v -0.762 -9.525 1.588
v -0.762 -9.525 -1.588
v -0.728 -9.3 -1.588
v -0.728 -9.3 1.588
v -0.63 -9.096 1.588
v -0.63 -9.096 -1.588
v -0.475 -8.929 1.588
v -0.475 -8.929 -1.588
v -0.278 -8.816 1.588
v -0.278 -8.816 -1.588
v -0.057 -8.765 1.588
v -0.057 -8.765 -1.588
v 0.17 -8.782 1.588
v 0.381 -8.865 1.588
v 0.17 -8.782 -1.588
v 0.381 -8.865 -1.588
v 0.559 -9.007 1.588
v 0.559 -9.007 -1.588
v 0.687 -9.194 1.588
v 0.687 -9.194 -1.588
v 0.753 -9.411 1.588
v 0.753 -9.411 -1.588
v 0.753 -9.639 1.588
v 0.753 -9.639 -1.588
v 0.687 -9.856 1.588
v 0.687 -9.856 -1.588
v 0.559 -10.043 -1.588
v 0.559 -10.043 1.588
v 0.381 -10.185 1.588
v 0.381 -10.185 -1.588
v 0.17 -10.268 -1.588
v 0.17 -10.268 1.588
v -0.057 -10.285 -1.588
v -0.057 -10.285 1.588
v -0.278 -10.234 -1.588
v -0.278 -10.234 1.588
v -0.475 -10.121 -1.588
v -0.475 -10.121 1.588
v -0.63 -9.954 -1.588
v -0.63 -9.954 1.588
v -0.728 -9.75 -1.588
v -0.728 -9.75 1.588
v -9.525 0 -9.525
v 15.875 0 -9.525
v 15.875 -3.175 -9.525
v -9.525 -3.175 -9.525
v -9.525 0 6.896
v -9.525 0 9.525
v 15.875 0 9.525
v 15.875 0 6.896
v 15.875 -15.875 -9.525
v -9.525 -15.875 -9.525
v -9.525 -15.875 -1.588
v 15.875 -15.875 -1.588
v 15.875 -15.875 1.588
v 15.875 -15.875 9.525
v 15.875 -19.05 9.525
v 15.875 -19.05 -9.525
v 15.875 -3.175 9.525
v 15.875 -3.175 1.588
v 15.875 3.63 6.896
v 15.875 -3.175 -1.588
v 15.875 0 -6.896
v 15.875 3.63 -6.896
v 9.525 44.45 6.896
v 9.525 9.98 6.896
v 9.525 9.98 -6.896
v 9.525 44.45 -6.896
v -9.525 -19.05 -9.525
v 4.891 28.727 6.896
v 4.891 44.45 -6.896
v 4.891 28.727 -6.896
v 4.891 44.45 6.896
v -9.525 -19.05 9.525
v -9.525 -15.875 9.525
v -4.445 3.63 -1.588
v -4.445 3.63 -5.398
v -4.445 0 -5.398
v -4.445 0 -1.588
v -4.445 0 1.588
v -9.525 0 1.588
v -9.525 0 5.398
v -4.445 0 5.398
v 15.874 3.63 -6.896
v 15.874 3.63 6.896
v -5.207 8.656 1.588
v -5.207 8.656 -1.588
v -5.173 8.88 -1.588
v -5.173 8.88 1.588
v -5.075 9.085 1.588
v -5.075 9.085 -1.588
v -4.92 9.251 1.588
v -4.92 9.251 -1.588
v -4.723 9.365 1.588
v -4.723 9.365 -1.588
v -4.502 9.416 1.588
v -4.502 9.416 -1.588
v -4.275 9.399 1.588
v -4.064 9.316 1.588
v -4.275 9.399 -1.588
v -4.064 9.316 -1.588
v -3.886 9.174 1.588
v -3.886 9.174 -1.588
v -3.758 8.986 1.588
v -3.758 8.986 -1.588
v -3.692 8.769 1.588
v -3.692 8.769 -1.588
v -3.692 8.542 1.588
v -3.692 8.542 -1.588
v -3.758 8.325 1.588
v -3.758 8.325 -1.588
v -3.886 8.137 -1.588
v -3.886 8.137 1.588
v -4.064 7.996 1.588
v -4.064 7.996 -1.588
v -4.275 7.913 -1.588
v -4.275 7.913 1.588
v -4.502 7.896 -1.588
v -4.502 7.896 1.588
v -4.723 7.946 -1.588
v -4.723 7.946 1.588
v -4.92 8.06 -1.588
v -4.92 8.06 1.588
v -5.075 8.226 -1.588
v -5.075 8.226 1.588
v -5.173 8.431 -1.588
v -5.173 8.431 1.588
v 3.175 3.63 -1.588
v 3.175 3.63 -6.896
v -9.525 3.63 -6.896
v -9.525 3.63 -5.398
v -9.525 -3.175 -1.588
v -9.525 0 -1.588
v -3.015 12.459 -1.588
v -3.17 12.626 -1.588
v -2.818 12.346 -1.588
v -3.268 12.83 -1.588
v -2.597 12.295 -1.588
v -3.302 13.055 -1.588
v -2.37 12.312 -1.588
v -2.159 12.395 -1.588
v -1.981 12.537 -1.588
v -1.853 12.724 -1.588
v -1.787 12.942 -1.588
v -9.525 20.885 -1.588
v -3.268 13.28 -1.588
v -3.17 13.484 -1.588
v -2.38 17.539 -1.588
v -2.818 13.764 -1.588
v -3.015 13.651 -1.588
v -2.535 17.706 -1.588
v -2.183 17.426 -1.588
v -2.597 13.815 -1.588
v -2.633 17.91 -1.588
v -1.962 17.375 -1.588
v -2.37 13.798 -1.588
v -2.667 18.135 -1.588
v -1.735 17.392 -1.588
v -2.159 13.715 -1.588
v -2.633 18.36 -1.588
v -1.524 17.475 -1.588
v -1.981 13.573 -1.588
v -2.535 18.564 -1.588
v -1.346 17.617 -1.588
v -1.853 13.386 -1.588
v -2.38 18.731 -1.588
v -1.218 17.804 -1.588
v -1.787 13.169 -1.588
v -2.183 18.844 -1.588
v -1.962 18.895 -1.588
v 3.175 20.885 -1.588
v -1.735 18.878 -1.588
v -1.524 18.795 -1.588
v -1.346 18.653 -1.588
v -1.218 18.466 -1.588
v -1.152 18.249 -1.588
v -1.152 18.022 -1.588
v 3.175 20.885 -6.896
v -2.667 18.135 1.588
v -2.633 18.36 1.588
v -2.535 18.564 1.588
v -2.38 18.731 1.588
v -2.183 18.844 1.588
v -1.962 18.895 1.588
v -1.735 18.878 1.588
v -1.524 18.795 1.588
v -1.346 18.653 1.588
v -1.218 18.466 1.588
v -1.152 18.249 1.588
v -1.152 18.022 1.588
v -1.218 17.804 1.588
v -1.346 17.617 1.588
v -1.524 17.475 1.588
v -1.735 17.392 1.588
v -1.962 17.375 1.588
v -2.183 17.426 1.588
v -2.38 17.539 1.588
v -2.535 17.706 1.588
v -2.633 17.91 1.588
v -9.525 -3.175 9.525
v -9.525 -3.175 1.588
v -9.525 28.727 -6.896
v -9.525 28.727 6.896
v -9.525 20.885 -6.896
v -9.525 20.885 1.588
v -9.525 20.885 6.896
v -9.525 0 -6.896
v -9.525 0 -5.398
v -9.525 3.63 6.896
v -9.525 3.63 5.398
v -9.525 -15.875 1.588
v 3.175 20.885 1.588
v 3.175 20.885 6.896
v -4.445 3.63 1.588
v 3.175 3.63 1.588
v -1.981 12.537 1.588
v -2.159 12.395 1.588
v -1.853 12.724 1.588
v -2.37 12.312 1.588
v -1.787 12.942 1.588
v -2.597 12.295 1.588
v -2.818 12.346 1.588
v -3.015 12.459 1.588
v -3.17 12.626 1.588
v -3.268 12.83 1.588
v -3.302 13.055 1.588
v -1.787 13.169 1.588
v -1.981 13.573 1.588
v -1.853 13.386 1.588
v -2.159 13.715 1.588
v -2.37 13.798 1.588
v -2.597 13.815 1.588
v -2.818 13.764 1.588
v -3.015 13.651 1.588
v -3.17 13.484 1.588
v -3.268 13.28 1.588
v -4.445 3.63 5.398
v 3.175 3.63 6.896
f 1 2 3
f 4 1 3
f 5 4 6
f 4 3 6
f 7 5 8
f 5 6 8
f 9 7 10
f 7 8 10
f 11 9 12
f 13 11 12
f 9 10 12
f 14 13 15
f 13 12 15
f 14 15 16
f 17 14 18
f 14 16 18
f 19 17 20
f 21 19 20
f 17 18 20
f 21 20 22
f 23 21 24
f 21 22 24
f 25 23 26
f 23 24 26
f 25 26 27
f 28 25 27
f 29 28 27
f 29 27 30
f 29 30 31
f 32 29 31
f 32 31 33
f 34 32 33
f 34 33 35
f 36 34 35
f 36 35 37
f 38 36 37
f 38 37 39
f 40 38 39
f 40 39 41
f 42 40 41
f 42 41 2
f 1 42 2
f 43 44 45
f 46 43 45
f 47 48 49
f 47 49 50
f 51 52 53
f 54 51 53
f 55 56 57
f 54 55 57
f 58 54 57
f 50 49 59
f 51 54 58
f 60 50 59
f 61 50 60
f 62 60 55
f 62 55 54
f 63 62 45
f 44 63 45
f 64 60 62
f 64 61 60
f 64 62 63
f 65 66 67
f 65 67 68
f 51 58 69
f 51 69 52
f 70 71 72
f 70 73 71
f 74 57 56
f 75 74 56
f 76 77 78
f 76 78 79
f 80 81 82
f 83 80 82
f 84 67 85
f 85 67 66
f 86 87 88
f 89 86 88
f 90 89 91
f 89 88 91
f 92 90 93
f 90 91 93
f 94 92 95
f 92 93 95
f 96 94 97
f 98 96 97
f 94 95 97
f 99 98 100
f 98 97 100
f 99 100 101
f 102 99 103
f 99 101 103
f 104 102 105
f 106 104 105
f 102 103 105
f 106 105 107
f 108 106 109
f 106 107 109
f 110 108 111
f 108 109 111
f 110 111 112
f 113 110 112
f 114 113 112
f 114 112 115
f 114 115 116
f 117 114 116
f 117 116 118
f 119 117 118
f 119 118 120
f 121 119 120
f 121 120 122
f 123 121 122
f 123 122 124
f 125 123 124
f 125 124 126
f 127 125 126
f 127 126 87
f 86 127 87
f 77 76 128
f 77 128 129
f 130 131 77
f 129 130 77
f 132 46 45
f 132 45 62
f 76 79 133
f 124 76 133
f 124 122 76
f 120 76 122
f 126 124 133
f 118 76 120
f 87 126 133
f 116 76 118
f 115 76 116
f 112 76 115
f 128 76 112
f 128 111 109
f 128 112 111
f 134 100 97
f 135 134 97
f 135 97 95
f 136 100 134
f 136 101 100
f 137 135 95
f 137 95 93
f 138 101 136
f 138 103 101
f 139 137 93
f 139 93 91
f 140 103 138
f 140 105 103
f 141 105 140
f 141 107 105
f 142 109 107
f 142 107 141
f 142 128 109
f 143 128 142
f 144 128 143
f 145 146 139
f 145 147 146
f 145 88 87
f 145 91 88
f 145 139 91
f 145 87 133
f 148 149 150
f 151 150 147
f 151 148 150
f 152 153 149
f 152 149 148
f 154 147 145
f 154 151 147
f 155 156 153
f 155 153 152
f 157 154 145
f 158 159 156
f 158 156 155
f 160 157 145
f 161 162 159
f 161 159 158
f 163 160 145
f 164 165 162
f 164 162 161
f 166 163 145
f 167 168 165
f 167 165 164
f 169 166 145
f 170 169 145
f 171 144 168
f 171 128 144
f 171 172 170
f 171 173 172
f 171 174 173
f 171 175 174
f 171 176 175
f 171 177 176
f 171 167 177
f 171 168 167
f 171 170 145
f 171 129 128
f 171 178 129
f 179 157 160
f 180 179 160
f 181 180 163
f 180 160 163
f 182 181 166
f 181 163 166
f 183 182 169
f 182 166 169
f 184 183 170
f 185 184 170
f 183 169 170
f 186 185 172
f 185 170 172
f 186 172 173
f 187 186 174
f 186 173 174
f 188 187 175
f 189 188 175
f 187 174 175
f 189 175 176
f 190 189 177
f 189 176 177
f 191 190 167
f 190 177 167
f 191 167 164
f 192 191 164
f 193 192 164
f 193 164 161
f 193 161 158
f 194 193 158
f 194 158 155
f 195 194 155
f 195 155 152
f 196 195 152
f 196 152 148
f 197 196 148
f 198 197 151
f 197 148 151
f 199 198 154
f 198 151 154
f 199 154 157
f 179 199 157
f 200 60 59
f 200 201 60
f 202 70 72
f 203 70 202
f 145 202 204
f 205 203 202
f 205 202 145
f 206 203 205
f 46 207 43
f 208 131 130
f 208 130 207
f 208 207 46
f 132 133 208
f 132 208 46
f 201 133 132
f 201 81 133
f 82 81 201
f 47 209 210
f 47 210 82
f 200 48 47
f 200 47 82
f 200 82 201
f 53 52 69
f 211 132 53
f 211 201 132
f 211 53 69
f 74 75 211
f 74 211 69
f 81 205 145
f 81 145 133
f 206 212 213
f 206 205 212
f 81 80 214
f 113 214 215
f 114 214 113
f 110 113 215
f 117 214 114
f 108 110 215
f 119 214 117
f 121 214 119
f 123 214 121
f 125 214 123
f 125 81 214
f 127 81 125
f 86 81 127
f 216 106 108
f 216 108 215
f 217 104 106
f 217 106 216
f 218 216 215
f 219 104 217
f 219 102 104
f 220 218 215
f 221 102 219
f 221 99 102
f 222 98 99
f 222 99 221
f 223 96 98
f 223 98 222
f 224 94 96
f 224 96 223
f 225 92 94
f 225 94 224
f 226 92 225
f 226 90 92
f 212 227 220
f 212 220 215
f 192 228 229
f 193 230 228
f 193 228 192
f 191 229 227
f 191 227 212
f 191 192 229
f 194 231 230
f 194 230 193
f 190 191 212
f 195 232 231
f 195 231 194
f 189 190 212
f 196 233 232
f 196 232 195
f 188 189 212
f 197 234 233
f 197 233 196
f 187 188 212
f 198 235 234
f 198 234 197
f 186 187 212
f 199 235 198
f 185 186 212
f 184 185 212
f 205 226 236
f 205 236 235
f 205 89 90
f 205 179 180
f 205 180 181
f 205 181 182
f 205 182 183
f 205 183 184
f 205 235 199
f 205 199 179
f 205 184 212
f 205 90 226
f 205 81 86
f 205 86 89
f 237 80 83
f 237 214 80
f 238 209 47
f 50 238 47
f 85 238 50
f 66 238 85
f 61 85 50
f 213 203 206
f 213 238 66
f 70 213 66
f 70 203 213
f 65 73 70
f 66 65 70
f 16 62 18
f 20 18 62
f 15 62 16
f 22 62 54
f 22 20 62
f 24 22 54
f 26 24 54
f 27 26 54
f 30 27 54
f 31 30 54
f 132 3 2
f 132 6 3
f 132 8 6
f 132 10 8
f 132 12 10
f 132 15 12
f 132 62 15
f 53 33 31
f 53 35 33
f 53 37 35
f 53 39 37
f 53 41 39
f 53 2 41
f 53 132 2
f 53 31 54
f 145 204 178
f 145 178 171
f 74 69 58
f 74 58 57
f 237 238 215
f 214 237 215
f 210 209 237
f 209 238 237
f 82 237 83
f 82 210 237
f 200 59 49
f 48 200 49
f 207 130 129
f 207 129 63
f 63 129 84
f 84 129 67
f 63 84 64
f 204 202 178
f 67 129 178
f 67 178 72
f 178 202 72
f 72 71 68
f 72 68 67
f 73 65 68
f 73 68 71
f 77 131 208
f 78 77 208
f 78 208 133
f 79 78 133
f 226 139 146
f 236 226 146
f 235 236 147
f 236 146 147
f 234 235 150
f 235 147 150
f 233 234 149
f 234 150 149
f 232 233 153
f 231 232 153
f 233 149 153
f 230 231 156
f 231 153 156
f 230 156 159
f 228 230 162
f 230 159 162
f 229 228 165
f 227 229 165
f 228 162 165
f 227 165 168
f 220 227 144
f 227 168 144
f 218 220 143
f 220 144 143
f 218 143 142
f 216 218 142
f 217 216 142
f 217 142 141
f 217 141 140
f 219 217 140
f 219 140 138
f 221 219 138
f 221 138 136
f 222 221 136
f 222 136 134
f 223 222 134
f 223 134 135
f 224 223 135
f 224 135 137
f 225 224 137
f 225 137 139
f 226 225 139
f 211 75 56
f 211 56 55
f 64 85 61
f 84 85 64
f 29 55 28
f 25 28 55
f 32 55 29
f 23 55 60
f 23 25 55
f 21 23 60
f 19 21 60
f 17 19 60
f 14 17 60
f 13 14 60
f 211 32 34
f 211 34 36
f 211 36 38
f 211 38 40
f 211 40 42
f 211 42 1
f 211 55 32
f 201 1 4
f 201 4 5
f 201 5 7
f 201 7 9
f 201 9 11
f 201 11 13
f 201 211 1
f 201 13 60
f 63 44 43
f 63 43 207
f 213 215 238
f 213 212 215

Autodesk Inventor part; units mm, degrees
ref_plane "YZ Plane" through (0, 0, 0) normal (1, 0, 0) x (0, 1, 0)
ref_plane "XZ Plane" through (0, 0, 0) normal (0, 1, 0) x (-1, 0, 0)
ref_plane "XY Plane" through (0, 0, 0) normal (0, 0, 1) x (1, 0, 0)
sketch "Sketch1" plane through (0, 0, 0) normal (0, 0, 1) x (1, 0, 0)
  line L0 (-9.525, 0) -> (9.525, 0)
  line L1 (9.525, 0) -> (9.525, 44.45)
  line L2 (9.525, 44.45) -> (5.715, 44.45)
  line L3 (5.715, 44.45) -> (4.891, 28.7274)
  line L4 (4.891, 28.7274) -> (-9.525, 28.7274)
  line L5 (-9.525, 28.7274) -> (-9.525, 0)
  point P0 (0, 0)
  point P1 (0, 0)
  dimension "d0" = 44.45
  dimension "d1" = 15.24
  dimension "d2" = 15.7226
  dimension "d3" = 19.05
  dimension "d14" = 93
extrude "Extrusion1" add sketch "Sketch1" along normal mid plane 15.7226
sketch "Sketch2" plane through (0, 0, 0) normal (1, 0, 0) x (0, 1, 0)
  line L0 (-19.05, 9.525) -> (-19.05, -9.525)
  line L1 (-19.05, -9.525) -> (-15.875, -9.525)
  line L2 (-15.875, -9.525) -> (-15.875, -1.5875)
  line L3 (-15.875, -1.5875) -> (-3.175, -1.5875)
  line L4 (-3.175, -1.5875) -> (-3.175, -9.525)
  line L5 (-3.175, -9.525) -> (0, -9.525)
  line L6 (0, -9.525) -> (0, 9.525)
  line L7 (0, 9.525) -> (-3.175, 9.525)
  line L8 (-3.175, 9.525) -> (-3.175, 1.5875)
  line L9 (-3.175, 1.5875) -> (-15.875, 1.5875)
  line L10 (-15.875, 1.5875) -> (-15.875, 9.525)
  line L11 (-15.875, 9.525) -> (-19.05, 9.525)
  line L12 (0, -7.8613) -> (0, 7.8613) projected
  point P0 (0, 0)
  point P1 (0, 0)
  dimension "d6" = 19.05
  dimension "d7" = 19.05
  dimension "d8" = 3.175
  dimension "d9" = 3.175
extrude "Extrusion2" add sketch "Sketch2" along normal mid plane 19.05
sketch "Sketch6" plane through (0, 0, 7.8613) normal (0, 0, 1) x (1, 0, 0)
  line L0 (4.891, 28.7274) -> (9.525, 28.7274)
  line L1 (9.525, 28.7274) -> (9.525, 44.45)
  line L2 (9.525, 44.45) -> (4.891, 44.45)
  line L3 (4.891, 44.45) -> (4.891, 28.7274)
  point P0 (0, 0)
extrude "Extrusion3" add sketch "Sketch6" against normal blind 15.7226
sketch "Sketch9" plane through (0, 0, 7.8613) normal (0, 0, 1) x (1, 0, 0)
  line L0 (4.891, 44.45) -> (4.891, 28.7274) projected
  line L1 (-9.525, 28.7274) -> (-9.525, 0) projected
  line L2 (4.891, 28.7274) -> (-2.729, 28.7274)
  line L3 (4.891, 28.7274) -> (-9.525, 28.7274) projected
  line L4 (-9.525, 28.7274) -> (-9.525, 26.7462)
  line L5 (-9.525, 26.7462) -> (-2.729, 28.7274)
  point P0 (0, 0)
  dimension "d22" = 14.416
  dimension "d23" = 7.62
  dimension "d24" = 1.9812
extrude "Extrusion5" cut sketch "Sketch9" against normal blind 25.4
fillet "Fillet2" radius 5.08 1 edges at (-2.729, 28.7274, 0)
sketch "Sketch10" plane through (-9.525, -15.875, 1.5875) normal (0, 0, 1) x (1, 0, 0)
  circle A0 centre (9.525, 6.35) radius 0.635
  line L0 (0, 0) -> (0, 12.7) projected
  line L1 (19.05, -3.175) -> (0, -3.175) projected
  point P0 (9.525, 15.875)
  dimension "d28" = 9.525
  dimension "d29" = 9.525
  dimension "d30" = 1.27
extrude "Extrusion6" cut sketch "Sketch10" against normal blind 25.4
sketch "Sketch12" plane through (-9.525, -15.875, -1.5875) normal (-1, 0, 0) x (0, 0, 1)
  line L0 (-6.2738, 60.325) -> (-6.2738, 15.875) projected
  line L1 (9.4488, 42.6212) -> (9.4488, 15.875) projected
  line L2 (-6.2738, 36.7601) -> (9.4488, 36.7601)
  line L3 (9.4488, 36.7601) -> (9.4488, 19.5053)
  line L4 (9.4488, 19.5053) -> (-6.2738, 19.5053)
  line L5 (-6.2738, 19.5053) -> (-6.2738, 36.7601)
  point P0 (1.5875, 15.875)
extrude "Extrusion7" cut sketch "Sketch12" against normal blind 12.7
sketch "Sketch13" plane through (3.175, -15.875, -1.5875) normal (-1, 0, 0) x (0, 0, 1)
  line L0 (0, 12.7) -> (0, 36.7601)
  line L1 (-6.2738, 36.7601) -> (9.4488, 36.7601) projected
  line L2 (0, 12.7) -> (0, 0) projected
  line L3 (3.175, 12.7) -> (3.175, 36.7601)
  line L4 (3.175, 0) -> (3.175, 12.7) projected
  line L5 (9.4488, 19.5053) -> (-6.2738, 19.5053) projected
  line L6 (0, 36.7601) -> (3.175, 36.7601)
  line L7 (3.175, 36.7601) -> (3.175, 19.5053)
  line L8 (3.175, 19.5053) -> (0, 19.5053)
  line L9 (0, 19.5053) -> (0, 36.7601)
  point P0 (1.5875, 15.875)
extrude "Extrusion8" add sketch "Sketch13" along normal blind 12.7
sketch "Sketch15" plane through (3.175, 3.6303, 1.5875) normal (0, 0, 1) x (1, 0, 0)
  circle A0 centre (-7.62, 5.0254) radius 0.635
  line L0 (-12.7, 0) -> (-12.7, 17.2548) projected
  circle A1 centre (-5.715, 9.4248) radius 0.635
  circle A2 centre (-5.08, 14.5048) radius 0.635
  point P0 (-3.175, -3.6303)
  dimension "d40" = 5.08
  dimension "d41" = 1.27
  dimension "d42" = 1.27
  dimension "d45" = 1.27
  dimension "d46" = 6.985
  dimension "d47" = 7.62
extrude "Extrusion9" cut sketch "Sketch15" against normal blind 12.7
sketch "Sketch17" plane through (-9.525, -15.875, -1.5875) normal (-1, 0, 0) x (0, 0, 1)
  line L0 (-7.9375, 15.875) -> (11.1125, 15.875)
  line L1 (0, 19.5053) -> (-3.81, 19.5053)
  line L2 (-3.81, 19.5053) -> (-3.81, 15.875)
  line L3 (-3.81, 15.875) -> (0, 15.875)
  line L4 (0, 15.875) -> (0, 19.5053)
  line L5 (3.175, 19.5053) -> (6.985, 19.5053)
  line L6 (6.985, 19.5053) -> (6.985, 15.875)
  line L7 (6.985, 15.875) -> (3.175, 15.875)
  line L8 (3.175, 15.875) -> (3.175, 19.5053)
  point P0 (1.5875, 15.875)
  dimension "d51" = 3.81
  dimension "d52" = 3.81
extrude "Extrusion10" cut sketch "Sketch17" against normal blind 5.08
sketch "Sketch18" plane through (9.525, 44.45, 7.8613) normal (1, 0, 0) x (0, 0, -1)
  line L0 (-1.6637, -63.5) -> (-1.6637, -60.325)
  line L1 (-1.6637, -60.325) -> (6.2738, -60.325)
  line L2 (6.2738, -60.325) -> (-1.6637, -60.325) projected
  line L3 (6.2738, -60.325) -> (6.2738, -47.625)
  line L4 (6.2738, -47.625) -> (-1.6637, -47.625)
  line L5 (-1.6637, -47.625) -> (-1.6637, -44.45)
  line L6 (-1.6637, -44.45) -> (-1.6637, -47.625) projected
  line L7 (-1.6637, -44.45) -> (0, -44.45)
  line L8 (0, -44.45) -> (0, -40.8197)
  line L9 (0, -44.45) -> (0, 0) projected
  line L10 (15.7226, 0) -> (15.7226, -44.45) projected
  line L11 (15.7226, -41.3057) -> (15.7226, -44.45)
  line L12 (17.3863, -44.45) -> (15.7226, -44.45) projected
  line L13 (15.7226, -44.45) -> (17.3863, -44.45)
  line L14 (17.3863, -44.45) -> (17.3863, -47.625)
  line L15 (17.3863, -47.625) -> (17.3863, -44.45) projected
  line L16 (17.3863, -47.625) -> (9.4488, -47.625)
  line L17 (9.4488, -47.625) -> (9.4488, -60.325)
  line L18 (17.3863, -60.325) -> (9.4488, -60.325) projected
  line L19 (9.4488, -60.325) -> (17.3863, -60.325)
  line L20 (17.3863, -63.5) -> (17.3863, -60.325) projected
  line L21 (17.3863, -60.325) -> (17.3863, -63.5)
  line L22 (17.3863, -63.5) -> (-1.6637, -63.5)
  line L23 (-1.6637, -63.5) -> (17.3863, -63.5) projected
  line L24 (0, -40.8197) -> (15.7226, -40.8197)
  line L25 (9.4488, -40.8197) -> (15.7226, -40.8197) projected
  line L26 (15.7226, -40.8197) -> (15.7226, -44.45)
  point P0 (7.8613, -44.45)
extrude "Extrusion11" add sketch "Sketch18" along normal blind 6.35
chamfer "Chamfer1" distance 6.35 angle 45 1 edges at (9.525, 3.6303, 0)
sketch "Sketch19" plane through (-9.525, -15.875, -1.5875) normal (0, 0, -1) x (-1, 0, 0)
  circle A0 centre (-9.525, 6.35) radius 0.762
  circle A1 centre (-9.525, 6.35) radius 0.635 projected
  point P0 (-9.525, 15.875)
  dimension "d60" = 0
  dimension "d61" = 0
  dimension "d62" = 1.524
extrude "Extrusion12" cut sketch "Sketch19" against normal blind 6.35
sketch "Sketch20" plane through (3.175, 3.6303, -1.5875) normal (0, 0, -1) x (-1, 0, 0)
  circle A0 centre (5.08, 14.5048) radius 0.762
  circle A1 centre (5.08, 14.5048) radius 0.635 projected
  circle A2 centre (5.715, 9.4248) radius 0.762
  circle A3 centre (5.715, 9.4248) radius 0.635 projected
  circle A4 centre (7.62, 5.0254) radius 0.762
  circle A5 centre (7.62, 5.0254) radius 0.635 projected
  point P0 (3.175, -3.6303)
  dimension "d65" = 0
  dimension "d66" = 0
  dimension "d67" = 1.524
  dimension "d68" = 0
  dimension "d69" = 0
  dimension "d70" = 1.524
  dimension "d71" = 0
  dimension "d72" = 0
  dimension "d73" = 1.524
extrude "Extrusion13" cut sketch "Sketch20" against normal blind 6.35
sketch "Sketch25" plane through (-9.525, -15.875, -1.5875) normal (-1, 0, 0) x (0, 0, 1)
  line L0 (9.4488, 19.5053) -> (9.4488, 15.875) projected
  line L1 (-6.2738, 15.875) -> (-6.2738, 19.5053) projected
  line L2 (-6.2738, 15.875) -> (-5.3086, 15.875)
  line L3 (-5.3086, 15.875) -> (-5.3086, 64.7795)
  line L4 (-5.3086, 64.7795) -> (-6.2738, 64.7795)
  line L5 (-6.2738, 64.7795) -> (-6.2738, 15.875)
  line L6 (9.4488, 15.875) -> (8.4836, 15.875)
  line L7 (8.4836, 15.875) -> (8.4836, 64.7795)
  line L8 (8.4836, 64.7795) -> (9.4488, 64.7795)
  line L9 (9.4488, 64.7795) -> (9.4488, 15.875)
  point P0 (1.5875, 15.875)
  dimension "d87" = 15.7226
  dimension "d88" = 0.9652
  dimension "d89" = 0.9652
extrude "Extrusion16" cut sketch "Sketch25" against normal blind 38.1
sketch "Sketch30" plane through (-9.525, 20.8851, 6.8961) normal (0, 0, 1) x (1, 0, 0)
  line L0 (0, 5.8611) -> (0, 0) projected
  line L1 (14.416, 7.8423) -> (7.5214, 7.8423) projected
  line L2 (0, 2.9305) -> (8.832, 2.9305)
  line L3 (8.832, 2.9305) -> (8.832, 7.8423)
  line L4 (8.832, 7.8423) -> (0, 7.8423)
  line L5 (0, 7.8423) -> (0, 2.9305)
  point P0 (9.525, -20.8851)
extrude "Extrusion17" add sketch "Sketch30" against normal blind 13.7922
properties part number "mod_gripper_flat" material "Steel, High Strength Low Alloy"
